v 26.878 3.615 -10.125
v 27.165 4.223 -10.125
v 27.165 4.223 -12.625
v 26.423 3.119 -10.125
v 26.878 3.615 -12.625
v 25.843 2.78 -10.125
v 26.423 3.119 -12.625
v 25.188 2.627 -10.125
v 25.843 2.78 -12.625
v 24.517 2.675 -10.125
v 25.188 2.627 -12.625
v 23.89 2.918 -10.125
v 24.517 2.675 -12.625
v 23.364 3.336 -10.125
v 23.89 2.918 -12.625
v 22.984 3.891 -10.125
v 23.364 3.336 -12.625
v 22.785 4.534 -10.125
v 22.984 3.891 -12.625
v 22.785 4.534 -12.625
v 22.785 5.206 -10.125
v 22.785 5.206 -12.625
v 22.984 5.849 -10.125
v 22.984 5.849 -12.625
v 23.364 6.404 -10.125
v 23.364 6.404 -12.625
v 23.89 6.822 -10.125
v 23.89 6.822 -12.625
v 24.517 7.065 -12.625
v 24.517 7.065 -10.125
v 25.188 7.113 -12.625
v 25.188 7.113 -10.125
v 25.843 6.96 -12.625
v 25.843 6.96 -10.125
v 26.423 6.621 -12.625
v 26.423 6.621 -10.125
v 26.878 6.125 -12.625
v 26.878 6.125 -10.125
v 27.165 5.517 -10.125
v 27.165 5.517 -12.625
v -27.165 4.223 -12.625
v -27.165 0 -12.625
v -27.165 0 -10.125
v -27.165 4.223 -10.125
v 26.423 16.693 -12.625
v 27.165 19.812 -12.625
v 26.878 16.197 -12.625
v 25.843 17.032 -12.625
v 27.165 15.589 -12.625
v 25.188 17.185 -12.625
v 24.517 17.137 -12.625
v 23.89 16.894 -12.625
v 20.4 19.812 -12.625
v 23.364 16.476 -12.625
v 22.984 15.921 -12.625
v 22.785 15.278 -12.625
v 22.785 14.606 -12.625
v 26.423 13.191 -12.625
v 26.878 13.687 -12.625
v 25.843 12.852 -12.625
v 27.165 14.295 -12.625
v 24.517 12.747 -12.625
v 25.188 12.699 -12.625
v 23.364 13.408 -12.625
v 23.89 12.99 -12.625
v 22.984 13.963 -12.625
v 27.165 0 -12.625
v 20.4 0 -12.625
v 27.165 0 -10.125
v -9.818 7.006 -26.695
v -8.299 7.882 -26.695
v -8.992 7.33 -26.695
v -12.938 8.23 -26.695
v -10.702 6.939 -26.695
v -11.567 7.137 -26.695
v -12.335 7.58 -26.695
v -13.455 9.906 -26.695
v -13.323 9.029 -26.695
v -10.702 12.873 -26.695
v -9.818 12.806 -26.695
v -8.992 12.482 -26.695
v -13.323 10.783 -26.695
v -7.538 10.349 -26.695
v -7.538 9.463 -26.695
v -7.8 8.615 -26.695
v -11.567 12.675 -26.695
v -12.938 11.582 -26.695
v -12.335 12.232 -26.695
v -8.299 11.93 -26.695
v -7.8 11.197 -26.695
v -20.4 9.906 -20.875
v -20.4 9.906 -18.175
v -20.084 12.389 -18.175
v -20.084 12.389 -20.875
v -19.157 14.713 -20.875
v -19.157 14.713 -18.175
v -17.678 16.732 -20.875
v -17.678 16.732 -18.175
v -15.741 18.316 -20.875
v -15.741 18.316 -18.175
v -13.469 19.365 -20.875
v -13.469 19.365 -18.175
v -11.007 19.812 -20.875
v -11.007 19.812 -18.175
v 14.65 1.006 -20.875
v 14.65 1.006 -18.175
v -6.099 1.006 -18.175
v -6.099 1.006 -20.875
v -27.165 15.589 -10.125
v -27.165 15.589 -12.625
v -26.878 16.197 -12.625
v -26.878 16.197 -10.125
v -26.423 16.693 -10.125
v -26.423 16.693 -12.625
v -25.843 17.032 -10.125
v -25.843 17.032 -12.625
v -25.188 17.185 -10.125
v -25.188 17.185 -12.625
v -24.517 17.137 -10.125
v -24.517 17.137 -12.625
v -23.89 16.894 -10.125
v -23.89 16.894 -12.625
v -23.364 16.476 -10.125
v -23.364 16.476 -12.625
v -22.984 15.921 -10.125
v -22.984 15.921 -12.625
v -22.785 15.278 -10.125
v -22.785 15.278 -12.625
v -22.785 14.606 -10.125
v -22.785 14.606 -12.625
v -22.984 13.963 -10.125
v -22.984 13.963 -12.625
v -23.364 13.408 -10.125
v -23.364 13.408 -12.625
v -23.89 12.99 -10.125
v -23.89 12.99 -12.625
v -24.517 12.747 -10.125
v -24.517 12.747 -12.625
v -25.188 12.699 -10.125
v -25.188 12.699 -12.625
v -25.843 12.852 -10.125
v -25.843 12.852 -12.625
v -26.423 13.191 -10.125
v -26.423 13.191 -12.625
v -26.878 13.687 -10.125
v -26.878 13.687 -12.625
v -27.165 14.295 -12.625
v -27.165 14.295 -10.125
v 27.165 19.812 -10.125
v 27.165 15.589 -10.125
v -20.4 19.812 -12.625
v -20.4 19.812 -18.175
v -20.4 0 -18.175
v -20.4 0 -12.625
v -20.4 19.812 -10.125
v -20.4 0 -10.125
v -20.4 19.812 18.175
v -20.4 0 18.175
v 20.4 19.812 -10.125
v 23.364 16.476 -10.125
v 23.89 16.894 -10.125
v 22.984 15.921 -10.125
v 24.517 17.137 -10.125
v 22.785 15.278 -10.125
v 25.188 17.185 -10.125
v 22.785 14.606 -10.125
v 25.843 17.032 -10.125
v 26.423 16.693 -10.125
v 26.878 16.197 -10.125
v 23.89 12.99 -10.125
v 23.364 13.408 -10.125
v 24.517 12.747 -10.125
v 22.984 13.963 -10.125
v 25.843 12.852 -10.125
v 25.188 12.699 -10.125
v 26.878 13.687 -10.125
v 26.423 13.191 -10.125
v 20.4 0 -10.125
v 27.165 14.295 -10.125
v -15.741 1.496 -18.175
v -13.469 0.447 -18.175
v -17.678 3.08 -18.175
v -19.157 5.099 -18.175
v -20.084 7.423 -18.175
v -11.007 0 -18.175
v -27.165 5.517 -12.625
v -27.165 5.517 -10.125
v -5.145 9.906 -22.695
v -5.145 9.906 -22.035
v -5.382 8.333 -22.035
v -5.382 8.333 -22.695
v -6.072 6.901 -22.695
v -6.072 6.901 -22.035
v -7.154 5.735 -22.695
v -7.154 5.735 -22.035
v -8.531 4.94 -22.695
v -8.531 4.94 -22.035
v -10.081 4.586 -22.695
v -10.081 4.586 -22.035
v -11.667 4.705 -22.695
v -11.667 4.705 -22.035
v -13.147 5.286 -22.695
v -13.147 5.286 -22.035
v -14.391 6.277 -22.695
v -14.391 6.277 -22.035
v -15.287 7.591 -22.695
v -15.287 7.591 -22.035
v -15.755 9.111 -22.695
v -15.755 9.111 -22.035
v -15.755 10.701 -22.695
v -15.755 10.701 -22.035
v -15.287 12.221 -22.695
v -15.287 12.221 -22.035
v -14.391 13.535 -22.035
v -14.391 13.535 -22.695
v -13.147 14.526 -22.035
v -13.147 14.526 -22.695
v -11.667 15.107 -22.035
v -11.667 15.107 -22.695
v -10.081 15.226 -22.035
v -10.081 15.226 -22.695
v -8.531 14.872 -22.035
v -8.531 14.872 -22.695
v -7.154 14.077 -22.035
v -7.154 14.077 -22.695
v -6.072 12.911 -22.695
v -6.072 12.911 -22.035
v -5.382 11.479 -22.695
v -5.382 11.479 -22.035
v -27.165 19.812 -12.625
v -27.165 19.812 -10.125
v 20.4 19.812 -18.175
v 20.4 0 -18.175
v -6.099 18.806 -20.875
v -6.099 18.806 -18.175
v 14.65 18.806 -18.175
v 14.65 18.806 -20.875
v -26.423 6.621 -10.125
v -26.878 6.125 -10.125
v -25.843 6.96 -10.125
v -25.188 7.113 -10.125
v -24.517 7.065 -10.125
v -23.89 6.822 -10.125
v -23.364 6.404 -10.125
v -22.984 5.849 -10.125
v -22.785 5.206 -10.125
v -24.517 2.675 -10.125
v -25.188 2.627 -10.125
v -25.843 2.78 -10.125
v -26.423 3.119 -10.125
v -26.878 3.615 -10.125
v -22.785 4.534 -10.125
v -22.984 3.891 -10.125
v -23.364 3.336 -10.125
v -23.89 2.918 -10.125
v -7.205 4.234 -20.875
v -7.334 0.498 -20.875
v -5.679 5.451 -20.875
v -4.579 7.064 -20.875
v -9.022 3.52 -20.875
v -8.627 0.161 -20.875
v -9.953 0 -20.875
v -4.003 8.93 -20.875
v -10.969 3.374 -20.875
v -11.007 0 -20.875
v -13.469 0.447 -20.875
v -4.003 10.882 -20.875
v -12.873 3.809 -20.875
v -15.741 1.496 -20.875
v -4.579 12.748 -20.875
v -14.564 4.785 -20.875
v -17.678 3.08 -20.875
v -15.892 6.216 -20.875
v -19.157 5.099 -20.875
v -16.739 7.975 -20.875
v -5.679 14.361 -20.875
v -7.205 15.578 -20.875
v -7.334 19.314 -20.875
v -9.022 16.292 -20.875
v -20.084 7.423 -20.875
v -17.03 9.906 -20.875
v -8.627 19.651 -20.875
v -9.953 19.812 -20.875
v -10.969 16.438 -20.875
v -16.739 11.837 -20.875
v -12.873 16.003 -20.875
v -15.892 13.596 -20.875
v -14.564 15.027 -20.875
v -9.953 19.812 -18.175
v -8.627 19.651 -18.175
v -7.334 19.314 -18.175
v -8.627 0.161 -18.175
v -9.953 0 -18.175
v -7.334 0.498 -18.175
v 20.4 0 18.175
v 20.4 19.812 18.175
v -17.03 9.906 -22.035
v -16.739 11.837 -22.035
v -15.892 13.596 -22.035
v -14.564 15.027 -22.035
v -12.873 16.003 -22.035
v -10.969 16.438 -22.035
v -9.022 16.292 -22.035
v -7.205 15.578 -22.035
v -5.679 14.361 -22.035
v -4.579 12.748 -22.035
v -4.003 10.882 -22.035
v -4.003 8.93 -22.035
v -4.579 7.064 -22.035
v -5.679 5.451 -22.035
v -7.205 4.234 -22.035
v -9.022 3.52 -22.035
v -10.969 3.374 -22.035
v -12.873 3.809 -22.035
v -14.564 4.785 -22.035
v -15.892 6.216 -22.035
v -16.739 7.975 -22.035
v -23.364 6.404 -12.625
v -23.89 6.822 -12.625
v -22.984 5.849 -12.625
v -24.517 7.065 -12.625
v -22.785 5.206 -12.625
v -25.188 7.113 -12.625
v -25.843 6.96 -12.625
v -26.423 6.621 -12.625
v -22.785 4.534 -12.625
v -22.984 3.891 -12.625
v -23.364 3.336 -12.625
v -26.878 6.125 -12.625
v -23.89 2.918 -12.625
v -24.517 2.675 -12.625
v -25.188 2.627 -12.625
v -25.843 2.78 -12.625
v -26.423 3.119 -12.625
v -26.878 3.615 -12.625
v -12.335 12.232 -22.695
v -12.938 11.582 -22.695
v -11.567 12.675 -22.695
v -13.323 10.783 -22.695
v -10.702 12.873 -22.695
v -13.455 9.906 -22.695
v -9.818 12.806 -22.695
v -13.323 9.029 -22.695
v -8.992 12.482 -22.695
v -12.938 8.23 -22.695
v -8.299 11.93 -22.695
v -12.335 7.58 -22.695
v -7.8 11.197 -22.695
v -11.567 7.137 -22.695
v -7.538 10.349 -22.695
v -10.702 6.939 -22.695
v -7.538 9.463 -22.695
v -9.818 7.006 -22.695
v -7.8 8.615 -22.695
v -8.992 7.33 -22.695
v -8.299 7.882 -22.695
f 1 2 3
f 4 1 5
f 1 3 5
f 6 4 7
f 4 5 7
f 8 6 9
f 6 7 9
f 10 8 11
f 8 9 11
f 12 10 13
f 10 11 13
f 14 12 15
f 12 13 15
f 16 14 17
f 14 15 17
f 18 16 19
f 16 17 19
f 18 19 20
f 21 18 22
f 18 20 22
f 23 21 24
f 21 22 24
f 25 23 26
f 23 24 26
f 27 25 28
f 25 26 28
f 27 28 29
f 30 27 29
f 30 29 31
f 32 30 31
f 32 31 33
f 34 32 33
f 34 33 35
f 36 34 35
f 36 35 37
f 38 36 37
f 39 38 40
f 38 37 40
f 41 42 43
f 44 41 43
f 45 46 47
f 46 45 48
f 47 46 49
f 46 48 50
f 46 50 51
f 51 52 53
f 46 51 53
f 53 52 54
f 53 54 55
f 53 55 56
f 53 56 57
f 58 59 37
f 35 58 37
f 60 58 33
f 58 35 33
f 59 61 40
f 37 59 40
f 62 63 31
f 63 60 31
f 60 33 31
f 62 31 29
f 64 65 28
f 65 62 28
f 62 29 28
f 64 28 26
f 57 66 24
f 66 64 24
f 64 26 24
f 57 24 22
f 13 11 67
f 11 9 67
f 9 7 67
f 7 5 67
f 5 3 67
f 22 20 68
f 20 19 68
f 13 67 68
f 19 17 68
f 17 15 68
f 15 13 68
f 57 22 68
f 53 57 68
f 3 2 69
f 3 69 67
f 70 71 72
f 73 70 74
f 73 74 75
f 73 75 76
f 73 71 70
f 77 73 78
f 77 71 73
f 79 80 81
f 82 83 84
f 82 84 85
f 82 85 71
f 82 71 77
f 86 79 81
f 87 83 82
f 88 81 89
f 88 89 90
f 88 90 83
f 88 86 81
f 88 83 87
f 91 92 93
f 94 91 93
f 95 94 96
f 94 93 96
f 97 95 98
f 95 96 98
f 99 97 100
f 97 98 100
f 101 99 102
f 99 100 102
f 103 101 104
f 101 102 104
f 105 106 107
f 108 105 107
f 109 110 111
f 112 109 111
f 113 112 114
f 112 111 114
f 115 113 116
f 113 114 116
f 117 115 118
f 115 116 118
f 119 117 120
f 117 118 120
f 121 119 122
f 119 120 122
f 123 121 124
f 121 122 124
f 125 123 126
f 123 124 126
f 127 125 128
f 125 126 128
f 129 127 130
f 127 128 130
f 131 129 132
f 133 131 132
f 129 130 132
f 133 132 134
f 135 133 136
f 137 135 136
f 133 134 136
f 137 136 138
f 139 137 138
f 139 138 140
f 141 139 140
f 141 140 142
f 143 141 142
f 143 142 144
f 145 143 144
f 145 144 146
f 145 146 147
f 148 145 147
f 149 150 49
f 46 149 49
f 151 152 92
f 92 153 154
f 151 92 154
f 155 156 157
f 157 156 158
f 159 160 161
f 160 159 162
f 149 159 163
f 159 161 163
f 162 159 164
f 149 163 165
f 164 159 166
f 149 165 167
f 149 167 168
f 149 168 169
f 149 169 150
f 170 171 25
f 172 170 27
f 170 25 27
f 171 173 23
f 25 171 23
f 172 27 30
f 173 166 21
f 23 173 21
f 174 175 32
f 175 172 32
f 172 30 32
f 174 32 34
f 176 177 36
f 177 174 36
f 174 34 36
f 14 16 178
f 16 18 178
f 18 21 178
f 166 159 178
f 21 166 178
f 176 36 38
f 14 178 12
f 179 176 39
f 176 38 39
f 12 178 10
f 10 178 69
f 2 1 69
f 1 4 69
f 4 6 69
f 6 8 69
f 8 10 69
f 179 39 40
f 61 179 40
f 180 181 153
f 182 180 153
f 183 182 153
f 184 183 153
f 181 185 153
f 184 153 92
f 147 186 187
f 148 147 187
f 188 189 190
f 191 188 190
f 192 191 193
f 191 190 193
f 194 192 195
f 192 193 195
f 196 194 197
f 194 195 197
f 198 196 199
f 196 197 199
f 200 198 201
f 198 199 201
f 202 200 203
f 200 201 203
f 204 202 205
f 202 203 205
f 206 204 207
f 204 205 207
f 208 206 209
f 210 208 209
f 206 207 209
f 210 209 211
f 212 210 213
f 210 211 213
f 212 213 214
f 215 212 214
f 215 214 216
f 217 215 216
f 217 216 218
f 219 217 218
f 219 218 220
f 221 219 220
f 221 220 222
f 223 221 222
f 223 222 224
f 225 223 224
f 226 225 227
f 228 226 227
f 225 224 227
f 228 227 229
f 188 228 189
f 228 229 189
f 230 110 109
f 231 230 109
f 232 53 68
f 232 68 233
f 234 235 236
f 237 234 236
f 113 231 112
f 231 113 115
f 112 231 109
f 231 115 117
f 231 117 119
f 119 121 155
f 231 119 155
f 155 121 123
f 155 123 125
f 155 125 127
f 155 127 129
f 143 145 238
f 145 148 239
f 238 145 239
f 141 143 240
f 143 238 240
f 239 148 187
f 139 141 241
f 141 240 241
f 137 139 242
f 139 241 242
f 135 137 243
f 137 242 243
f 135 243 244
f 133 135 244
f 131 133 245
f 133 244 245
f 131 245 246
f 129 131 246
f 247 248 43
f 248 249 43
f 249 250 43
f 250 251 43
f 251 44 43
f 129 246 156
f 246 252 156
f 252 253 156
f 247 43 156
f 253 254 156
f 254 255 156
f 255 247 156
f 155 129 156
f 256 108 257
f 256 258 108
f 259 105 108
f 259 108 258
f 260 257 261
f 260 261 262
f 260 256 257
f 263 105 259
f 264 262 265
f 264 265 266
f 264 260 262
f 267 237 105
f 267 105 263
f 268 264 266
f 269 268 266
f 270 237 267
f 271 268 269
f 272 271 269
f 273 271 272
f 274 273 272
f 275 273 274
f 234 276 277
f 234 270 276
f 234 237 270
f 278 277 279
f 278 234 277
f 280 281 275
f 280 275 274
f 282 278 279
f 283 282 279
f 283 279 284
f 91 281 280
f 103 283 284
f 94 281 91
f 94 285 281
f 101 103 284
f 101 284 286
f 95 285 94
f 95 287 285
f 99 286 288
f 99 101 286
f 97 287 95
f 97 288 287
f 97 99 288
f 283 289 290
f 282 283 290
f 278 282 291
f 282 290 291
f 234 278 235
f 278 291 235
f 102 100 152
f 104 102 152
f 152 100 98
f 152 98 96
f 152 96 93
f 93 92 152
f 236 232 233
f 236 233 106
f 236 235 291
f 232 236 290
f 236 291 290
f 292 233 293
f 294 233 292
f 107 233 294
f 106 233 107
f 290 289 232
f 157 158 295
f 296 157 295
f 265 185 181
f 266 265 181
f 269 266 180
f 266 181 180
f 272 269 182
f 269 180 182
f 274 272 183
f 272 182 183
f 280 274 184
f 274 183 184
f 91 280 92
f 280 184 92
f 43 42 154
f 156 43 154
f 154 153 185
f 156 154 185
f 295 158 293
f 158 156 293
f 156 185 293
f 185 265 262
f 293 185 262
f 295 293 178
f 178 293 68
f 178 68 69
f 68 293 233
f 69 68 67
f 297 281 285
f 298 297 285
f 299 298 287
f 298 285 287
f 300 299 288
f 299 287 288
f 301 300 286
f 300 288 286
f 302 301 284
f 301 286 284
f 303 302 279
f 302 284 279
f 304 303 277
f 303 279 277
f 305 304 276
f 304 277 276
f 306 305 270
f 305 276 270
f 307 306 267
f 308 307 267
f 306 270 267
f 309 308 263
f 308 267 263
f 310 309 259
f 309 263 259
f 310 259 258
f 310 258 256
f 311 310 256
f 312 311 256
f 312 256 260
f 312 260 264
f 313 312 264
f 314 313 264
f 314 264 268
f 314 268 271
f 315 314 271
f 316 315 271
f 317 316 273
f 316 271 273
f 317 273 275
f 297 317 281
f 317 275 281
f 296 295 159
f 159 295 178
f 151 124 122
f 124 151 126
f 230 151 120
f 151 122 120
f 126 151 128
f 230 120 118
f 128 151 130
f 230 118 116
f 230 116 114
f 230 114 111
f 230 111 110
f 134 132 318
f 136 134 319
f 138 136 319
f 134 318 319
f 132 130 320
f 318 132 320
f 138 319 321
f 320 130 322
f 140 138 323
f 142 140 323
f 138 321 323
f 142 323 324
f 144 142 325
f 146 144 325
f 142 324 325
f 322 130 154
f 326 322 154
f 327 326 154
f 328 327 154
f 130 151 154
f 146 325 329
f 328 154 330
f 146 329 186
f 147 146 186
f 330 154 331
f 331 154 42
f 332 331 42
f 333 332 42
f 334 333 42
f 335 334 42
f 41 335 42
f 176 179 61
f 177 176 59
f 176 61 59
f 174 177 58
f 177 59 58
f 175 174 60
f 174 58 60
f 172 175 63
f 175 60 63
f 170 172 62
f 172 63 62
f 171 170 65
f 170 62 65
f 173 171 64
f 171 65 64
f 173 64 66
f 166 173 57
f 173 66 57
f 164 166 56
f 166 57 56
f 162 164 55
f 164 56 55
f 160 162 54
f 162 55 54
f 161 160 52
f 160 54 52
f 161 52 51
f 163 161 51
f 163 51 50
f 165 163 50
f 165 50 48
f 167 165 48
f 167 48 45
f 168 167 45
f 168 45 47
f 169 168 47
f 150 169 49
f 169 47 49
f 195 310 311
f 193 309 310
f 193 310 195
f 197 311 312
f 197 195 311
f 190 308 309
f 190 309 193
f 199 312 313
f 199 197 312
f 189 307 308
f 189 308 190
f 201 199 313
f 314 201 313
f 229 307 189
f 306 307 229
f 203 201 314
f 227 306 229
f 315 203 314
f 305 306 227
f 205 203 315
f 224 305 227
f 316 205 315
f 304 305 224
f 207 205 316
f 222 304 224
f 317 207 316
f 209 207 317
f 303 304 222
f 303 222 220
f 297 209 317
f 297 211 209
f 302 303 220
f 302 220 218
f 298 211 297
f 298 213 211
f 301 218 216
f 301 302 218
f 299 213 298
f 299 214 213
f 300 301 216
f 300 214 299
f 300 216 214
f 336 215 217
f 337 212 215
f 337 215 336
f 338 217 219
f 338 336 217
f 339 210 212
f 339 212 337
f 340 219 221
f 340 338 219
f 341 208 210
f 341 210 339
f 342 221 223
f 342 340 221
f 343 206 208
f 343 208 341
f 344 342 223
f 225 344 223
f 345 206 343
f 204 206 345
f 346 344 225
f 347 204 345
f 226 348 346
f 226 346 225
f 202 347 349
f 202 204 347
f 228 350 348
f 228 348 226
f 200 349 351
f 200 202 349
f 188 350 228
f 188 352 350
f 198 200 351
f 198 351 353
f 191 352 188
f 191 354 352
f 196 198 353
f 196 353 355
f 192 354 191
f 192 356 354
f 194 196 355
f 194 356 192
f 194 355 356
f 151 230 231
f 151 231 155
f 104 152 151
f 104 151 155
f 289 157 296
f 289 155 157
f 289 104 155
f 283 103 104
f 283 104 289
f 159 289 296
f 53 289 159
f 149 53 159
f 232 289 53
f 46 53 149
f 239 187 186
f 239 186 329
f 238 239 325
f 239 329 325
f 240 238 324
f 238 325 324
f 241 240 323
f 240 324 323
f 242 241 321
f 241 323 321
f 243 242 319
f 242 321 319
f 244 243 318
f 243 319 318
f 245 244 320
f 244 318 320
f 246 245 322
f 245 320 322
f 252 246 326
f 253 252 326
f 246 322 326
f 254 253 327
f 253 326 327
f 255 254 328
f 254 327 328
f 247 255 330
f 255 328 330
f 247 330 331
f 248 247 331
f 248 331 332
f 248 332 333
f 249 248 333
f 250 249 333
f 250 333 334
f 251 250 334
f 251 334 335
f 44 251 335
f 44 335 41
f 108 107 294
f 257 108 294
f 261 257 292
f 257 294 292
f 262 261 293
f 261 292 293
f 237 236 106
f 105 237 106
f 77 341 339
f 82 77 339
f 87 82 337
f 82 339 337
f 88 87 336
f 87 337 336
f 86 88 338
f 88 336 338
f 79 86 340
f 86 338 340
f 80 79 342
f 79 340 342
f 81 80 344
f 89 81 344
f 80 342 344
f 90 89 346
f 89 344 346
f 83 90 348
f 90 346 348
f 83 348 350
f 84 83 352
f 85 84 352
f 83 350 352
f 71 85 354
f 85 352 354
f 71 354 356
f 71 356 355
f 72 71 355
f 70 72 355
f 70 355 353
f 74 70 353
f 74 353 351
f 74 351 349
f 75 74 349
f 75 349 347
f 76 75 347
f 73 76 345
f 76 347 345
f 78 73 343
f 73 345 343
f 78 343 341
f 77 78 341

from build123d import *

# Parameters (mm, degrees)
BOSS_EXTRUDE1_DEPTH  = 19.812
SKETCH2_R            = 2.249999945
CUT_EXTRUDE1_DEPTH   = 46.597067399
BOSS_EXTRUDE2_DEPTH  = 2.699999934
SKETCH12_R           = 6.549999981
BOSS_EXTRUDE8_DEPTH  = 1.159999966
SKETCH13_R           = 5.334999998
BOSS_EXTRUDE9_DEPTH  = 0.65999995
SKETCH14_R           = 2.975000019
BOSS_EXTRUDE11_DEPTH = 4.000000128


with BuildPart() as part:
    # Sketch1 → Boss-Extrude1 (new body)
    with BuildSketch(Plane(origin=(0, 0, 0), x_dir=(1, 0, 0), z_dir=(0, 1, 0))):
        Polygon((-20.399999967, -18.174999972), (20.399999967, -18.174999972), (20.399999967, 10.124999816), (27.164999899, 10.124999816), (27.164999899, 12.624999896), (20.399999967, 12.624999896), (20.399999967, 18.174999972), (-20.399999967, 18.174999972), (-20.399999967, 12.624999896), (-27.164999899, 12.624999896), (-27.164999899, 10.124999816), (-20.399999967, 10.124999816), align=None)
    extrude(amount=BOSS_EXTRUDE1_DEPTH)

    # Sketch2 → Cut-Extrude1 (cut, through all)
    with BuildSketch(Plane(origin=(0, 0, -12.624999896), x_dir=(-1, 0, 0), z_dir=(0, 0, -1))):
        with Locations((25.009999891, 4.869999912)):
            Circle(SKETCH2_R)
        with Locations((25.009999891, 14.942000088)):
            Circle(SKETCH2_R)
        with Locations((-25.009999891, 4.869999912)):
            Circle(SKETCH2_R)
        with Locations((-25.009999891, 14.942000088)):
            Circle(SKETCH2_R)
    extrude(amount=-CUT_EXTRUDE1_DEPTH, mode=Mode.SUBTRACT)

    # Sketch3 → Boss-Extrude2 (add)
    with BuildSketch(Plane(origin=(0, 0, -18.174999972), x_dir=(-1, 0, 0), z_dir=(0, 0, -1))):
        with BuildLine():
            Line((-14.650000037, 18.80599998), (-14.650000037, 1.00600002))
            Line((-14.650000037, 1.00600002), (6.098630297, 1.00600002))
            ThreePointArc((6.098630297, 1.00600002), (0.559999979, 9.906), (6.098630297, 18.80599998))
            Line((6.098630297, 18.80599998), (-14.650000037, 18.80599998))
        make_face()
        with BuildLine():
            ThreePointArc((6.098630297, 18.80599998), (0.559999979, 9.906), (6.098630297, 1.00600002))
            ThreePointArc((6.098630297, 1.00600002), (7.974875683, 0.307523445), (9.953156655, 0))
            Line((9.953156655, 0), (11.006843291, 0))
            ThreePointArc((11.006843291, 0), (17.678356924, 3.08030904), (20.399999967, 9.906))
            ThreePointArc((20.399999967, 9.906), (17.678356924, 16.73169096), (11.006843291, 19.812))
            Line((11.006843291, 19.812), (9.953156655, 19.812))
            ThreePointArc((9.953156655, 19.812), (7.974875683, 19.504476555), (6.098630297, 18.80599998))
        make_face()
    extrude(amount=BOSS_EXTRUDE2_DEPTH)

    # Sketch12 → Boss-Extrude8 (add)
    with BuildSketch(Plane(origin=(0, 0, -20.874999906), x_dir=(-1, 0, 0), z_dir=(0, 0, -1))):
        with Locations((10.479999973, 9.906)):
            Circle(SKETCH12_R)
    extrude(amount=BOSS_EXTRUDE8_DEPTH)

    # Sketch13 → Boss-Extrude9 (add)
    with BuildSketch(Plane(origin=(0, 0, -22.034999872), x_dir=(-1, 0, 0), z_dir=(0, 0, -1))):
        with Locations(Location((10.479999973, 9.906, 0), (0, 0, 180))):
            Circle(SKETCH13_R)
    extrude(amount=BOSS_EXTRUDE9_DEPTH)

    # Sketch14 → Boss-Extrude11 (add)
    with BuildSketch(Plane(origin=(0, 0, -22.694999822), x_dir=(-1, 0, 0), z_dir=(0, 0, -1))):
        with Locations((10.479999973, 9.906)):
            Circle(SKETCH14_R)
    extrude(amount=BOSS_EXTRUDE11_DEPTH)


solid = part.part
